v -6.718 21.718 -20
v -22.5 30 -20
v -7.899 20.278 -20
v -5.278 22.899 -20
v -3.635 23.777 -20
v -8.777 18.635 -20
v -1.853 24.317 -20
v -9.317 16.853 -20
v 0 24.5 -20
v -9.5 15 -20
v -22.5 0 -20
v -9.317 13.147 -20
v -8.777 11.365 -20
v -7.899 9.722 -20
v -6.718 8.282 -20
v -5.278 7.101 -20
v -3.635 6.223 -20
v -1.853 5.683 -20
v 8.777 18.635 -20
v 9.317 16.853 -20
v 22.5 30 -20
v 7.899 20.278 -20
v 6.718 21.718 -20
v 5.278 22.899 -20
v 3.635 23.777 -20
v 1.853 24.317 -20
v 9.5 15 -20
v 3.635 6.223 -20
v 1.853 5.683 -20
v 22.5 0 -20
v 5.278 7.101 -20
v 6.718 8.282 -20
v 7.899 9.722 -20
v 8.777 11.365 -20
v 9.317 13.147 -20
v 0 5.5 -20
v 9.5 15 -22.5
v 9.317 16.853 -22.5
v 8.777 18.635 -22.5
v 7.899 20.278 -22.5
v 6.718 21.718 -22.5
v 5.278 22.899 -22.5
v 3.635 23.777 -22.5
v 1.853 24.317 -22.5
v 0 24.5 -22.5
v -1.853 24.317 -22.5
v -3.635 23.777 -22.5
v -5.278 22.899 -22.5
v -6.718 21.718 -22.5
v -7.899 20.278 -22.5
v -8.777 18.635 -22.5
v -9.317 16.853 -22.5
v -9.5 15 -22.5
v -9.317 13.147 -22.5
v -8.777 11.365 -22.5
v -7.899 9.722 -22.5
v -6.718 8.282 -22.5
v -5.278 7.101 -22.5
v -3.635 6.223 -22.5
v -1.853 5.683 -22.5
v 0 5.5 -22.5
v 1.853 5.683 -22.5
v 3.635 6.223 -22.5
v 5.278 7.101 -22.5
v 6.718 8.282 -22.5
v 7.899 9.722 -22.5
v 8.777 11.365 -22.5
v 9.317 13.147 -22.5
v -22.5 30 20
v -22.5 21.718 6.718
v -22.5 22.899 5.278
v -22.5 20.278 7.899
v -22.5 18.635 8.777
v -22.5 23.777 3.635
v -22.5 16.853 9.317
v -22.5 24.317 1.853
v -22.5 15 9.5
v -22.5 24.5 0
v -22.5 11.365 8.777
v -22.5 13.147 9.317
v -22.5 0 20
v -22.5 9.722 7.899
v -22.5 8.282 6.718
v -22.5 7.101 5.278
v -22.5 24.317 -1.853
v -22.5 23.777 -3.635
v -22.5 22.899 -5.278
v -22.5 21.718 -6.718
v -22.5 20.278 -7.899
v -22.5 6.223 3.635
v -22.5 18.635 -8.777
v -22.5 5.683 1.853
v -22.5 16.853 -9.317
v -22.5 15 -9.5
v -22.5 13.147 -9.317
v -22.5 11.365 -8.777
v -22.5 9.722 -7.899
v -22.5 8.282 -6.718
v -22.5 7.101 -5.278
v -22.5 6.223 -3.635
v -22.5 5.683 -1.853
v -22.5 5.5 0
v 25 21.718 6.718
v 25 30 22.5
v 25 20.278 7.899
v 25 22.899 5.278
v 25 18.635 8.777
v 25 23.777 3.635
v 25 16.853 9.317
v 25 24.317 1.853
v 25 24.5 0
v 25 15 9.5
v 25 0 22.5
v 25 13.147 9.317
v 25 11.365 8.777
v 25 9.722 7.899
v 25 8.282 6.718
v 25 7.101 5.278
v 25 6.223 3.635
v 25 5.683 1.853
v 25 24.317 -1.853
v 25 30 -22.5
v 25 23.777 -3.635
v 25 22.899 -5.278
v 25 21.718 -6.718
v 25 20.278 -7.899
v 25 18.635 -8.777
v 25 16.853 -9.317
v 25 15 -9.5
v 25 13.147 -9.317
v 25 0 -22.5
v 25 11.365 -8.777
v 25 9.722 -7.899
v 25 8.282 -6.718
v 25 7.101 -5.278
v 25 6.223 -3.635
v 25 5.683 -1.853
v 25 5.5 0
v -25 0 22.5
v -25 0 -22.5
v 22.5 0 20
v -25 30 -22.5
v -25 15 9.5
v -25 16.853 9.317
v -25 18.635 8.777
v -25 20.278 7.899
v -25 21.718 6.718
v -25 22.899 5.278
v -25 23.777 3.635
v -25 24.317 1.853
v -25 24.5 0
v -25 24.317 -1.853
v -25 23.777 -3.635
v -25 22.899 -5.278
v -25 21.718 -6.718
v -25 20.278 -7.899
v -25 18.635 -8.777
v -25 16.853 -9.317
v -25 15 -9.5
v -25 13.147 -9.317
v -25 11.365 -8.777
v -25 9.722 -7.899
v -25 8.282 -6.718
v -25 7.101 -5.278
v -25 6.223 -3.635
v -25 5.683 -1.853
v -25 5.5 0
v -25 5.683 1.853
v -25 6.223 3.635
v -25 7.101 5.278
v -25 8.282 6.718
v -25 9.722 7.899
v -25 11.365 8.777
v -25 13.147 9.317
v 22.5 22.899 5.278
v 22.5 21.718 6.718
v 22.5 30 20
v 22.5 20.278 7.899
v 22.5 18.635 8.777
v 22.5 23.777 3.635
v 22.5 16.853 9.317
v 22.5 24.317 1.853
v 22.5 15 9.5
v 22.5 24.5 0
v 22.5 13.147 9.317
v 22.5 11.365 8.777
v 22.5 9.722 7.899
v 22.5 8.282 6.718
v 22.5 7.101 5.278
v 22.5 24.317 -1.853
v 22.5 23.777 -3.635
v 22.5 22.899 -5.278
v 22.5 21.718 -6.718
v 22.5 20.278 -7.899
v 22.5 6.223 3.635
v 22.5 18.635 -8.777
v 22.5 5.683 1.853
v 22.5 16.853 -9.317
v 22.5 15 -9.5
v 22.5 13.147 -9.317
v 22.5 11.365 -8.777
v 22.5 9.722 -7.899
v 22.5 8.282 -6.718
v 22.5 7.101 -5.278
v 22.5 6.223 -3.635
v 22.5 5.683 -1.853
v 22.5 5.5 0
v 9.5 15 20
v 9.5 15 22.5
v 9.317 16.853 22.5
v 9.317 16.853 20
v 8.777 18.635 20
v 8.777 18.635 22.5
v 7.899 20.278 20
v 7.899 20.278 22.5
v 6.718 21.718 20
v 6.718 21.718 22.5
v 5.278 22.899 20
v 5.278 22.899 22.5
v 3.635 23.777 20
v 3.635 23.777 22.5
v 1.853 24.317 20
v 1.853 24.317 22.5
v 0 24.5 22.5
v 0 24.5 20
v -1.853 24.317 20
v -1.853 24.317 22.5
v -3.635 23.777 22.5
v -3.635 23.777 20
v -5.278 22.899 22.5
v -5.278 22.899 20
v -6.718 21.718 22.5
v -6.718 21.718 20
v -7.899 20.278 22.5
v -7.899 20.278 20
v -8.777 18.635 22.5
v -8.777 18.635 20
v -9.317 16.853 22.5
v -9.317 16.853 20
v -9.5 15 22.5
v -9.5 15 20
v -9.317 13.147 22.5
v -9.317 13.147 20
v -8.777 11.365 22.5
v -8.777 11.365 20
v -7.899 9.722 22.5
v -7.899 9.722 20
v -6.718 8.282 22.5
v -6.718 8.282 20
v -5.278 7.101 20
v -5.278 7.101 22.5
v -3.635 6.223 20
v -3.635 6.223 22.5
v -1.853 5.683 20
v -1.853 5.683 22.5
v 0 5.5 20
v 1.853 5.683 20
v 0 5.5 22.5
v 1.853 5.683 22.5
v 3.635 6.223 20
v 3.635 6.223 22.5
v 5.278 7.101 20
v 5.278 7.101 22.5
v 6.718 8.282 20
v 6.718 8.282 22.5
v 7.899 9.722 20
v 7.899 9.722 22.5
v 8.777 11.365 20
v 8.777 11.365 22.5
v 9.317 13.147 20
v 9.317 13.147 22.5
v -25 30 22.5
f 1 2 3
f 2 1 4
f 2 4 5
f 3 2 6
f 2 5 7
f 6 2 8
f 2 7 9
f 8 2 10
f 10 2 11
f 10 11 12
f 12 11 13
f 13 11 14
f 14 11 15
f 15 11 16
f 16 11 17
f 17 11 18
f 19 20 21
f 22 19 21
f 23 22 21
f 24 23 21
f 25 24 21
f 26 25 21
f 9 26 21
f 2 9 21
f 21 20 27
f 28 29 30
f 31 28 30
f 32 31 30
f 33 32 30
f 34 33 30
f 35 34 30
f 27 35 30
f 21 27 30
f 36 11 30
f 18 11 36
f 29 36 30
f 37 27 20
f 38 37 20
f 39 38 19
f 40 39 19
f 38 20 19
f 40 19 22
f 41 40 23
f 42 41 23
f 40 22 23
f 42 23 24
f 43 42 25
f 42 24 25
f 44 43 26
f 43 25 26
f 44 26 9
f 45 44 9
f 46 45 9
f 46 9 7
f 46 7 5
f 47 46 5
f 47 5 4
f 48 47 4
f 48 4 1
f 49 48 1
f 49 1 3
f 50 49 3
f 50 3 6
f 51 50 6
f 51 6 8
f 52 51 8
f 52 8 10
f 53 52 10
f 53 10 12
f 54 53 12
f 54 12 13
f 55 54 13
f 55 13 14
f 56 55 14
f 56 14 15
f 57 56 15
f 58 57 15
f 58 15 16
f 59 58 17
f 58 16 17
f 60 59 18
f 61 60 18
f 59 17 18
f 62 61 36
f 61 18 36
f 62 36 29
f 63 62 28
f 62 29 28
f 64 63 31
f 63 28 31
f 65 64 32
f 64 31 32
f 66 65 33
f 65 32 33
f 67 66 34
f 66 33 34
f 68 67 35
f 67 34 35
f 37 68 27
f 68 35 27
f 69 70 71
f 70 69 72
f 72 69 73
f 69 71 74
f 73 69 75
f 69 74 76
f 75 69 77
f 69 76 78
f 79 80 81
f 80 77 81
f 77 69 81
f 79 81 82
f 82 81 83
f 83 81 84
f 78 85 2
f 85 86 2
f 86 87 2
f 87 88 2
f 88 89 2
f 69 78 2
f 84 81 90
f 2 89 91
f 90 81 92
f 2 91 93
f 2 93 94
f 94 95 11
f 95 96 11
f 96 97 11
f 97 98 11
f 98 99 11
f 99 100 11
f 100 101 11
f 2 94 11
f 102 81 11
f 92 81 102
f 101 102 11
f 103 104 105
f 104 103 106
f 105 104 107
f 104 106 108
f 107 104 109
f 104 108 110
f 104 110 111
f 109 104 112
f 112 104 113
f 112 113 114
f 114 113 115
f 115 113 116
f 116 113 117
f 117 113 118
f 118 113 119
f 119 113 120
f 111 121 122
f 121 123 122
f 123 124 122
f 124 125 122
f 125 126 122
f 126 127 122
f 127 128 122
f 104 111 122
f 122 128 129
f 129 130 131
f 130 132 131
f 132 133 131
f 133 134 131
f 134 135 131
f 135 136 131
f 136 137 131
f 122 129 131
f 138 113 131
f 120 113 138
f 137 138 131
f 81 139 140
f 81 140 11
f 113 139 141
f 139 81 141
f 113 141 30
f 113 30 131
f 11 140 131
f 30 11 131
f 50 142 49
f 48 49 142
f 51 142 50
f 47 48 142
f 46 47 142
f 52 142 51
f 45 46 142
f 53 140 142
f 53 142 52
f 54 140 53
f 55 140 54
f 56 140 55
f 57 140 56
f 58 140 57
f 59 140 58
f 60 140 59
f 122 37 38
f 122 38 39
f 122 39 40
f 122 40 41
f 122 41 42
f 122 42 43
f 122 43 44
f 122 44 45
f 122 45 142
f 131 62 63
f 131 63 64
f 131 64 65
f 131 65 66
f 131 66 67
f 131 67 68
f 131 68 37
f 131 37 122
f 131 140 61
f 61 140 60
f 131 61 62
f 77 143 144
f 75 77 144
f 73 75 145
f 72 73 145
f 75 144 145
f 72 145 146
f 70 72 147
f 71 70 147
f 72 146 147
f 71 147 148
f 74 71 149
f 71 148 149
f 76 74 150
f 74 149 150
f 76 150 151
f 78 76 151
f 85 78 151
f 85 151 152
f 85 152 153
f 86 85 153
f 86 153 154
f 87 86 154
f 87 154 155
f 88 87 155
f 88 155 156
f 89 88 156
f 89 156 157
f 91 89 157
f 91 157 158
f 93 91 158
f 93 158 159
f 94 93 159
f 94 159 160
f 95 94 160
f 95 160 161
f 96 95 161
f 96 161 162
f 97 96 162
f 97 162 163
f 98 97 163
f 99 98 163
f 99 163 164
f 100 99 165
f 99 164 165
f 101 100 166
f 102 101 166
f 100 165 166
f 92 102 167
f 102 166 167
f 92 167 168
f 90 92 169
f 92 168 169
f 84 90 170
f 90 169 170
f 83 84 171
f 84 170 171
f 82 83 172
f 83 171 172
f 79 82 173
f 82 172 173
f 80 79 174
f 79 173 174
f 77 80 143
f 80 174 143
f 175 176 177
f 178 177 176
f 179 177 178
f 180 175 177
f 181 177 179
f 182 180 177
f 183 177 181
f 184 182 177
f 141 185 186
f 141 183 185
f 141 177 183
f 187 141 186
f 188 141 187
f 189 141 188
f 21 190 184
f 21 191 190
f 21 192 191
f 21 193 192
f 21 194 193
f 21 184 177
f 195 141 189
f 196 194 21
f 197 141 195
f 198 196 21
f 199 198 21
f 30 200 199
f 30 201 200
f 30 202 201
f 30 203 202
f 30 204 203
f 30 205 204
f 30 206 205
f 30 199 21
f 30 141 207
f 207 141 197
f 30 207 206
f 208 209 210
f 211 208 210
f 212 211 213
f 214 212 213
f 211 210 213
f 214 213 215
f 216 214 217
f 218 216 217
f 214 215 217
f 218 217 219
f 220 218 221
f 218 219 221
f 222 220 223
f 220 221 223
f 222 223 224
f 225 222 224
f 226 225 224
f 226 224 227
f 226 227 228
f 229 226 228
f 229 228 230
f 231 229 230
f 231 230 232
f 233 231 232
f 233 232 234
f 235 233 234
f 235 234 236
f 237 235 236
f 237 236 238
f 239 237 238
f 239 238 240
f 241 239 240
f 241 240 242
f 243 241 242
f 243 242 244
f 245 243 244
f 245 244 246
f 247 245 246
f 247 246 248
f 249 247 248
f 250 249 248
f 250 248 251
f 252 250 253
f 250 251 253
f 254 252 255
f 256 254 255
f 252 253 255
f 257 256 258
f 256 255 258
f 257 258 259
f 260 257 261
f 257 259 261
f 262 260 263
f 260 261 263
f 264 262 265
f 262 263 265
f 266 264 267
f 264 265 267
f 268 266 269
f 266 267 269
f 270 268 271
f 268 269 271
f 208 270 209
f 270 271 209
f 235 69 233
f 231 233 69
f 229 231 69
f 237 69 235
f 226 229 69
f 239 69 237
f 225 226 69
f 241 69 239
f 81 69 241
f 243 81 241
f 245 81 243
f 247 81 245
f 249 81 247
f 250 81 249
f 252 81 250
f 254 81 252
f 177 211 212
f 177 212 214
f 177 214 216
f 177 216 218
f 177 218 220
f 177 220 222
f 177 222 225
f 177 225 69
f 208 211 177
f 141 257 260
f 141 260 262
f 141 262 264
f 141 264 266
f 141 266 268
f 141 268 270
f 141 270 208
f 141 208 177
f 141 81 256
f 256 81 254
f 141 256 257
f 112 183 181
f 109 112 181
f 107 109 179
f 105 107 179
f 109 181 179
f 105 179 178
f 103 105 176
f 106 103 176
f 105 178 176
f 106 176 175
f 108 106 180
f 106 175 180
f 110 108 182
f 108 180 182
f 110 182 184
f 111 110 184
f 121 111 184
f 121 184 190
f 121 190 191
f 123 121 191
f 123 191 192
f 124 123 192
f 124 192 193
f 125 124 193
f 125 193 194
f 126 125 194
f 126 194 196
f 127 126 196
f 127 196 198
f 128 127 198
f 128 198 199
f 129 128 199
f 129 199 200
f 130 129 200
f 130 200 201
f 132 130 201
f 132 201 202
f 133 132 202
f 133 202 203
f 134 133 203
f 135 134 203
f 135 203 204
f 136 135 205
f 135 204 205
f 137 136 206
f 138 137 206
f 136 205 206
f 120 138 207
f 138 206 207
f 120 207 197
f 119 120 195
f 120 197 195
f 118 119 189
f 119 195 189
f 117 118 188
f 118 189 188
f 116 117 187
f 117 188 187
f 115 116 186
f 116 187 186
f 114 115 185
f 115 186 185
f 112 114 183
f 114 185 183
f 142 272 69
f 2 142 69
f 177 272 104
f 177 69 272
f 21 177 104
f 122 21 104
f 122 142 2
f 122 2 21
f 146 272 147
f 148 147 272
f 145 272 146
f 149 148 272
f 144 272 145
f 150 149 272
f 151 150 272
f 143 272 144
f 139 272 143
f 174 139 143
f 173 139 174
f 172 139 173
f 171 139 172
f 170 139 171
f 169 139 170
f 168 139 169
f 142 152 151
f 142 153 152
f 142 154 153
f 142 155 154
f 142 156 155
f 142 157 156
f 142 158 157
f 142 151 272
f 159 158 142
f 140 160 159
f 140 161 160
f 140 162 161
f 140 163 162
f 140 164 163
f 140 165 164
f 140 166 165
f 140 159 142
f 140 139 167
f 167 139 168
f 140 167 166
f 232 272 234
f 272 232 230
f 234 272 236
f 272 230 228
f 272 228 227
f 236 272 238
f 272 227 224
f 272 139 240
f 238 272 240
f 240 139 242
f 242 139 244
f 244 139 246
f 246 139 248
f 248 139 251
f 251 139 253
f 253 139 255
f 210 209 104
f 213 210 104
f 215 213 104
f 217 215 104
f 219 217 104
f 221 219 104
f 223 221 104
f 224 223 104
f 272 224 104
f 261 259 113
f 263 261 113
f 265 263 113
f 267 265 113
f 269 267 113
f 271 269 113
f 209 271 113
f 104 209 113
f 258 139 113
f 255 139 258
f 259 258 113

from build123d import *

# Parameters (mm, degrees)
SKETCH2_W               = 50
SKETCH2_H               = 45
SKETCH2_W_2             = 45
SKETCH2_H_2             = 40
BOSS_EXTRUDE1_DEPTH     = 30
SKETCH4_R               = 9.5
CUT_EXTRUDE1_DEPTH      = 1
CUT_EXTRUDE1_DEPTH_BACK = 46
SKETCH5_R               = 9.5
CUT_EXTRUDE2_DEPTH      = 1
CUT_EXTRUDE2_DEPTH_BACK = 51


with BuildPart() as part:
    # Sketch2 → Boss-Extrude1 (new body)
    with BuildSketch(Plane(origin=(0, 0, 0), x_dir=(1, 0, 0), z_dir=(0, 1, 0))):
        Rectangle(SKETCH2_W, SKETCH2_H)
        Rectangle(SKETCH2_W_2, SKETCH2_H_2, mode=Mode.SUBTRACT)
    extrude(amount=BOSS_EXTRUDE1_DEPTH)

    # Sketch4 → Cut-Extrude1 (cut, two sides)
    with BuildSketch(Plane.XY.offset(22.5)) as cut_extrude1_sk:
        with Locations((0, 15)):
            Circle(SKETCH4_R)
    extrude(amount=CUT_EXTRUDE1_DEPTH, mode=Mode.SUBTRACT)
    extrude(cut_extrude1_sk.sketch, amount=-CUT_EXTRUDE1_DEPTH_BACK, mode=Mode.SUBTRACT)

    # Sketch5 → Cut-Extrude2 (cut, two sides)
    with BuildSketch(Plane.ZY.offset(25)) as cut_extrude2_sk:
        with Locations((0, 15)):
            Circle(SKETCH5_R)
    extrude(amount=CUT_EXTRUDE2_DEPTH, mode=Mode.SUBTRACT)
    extrude(cut_extrude2_sk.sketch, amount=-CUT_EXTRUDE2_DEPTH_BACK, mode=Mode.SUBTRACT)


solid = part.part
